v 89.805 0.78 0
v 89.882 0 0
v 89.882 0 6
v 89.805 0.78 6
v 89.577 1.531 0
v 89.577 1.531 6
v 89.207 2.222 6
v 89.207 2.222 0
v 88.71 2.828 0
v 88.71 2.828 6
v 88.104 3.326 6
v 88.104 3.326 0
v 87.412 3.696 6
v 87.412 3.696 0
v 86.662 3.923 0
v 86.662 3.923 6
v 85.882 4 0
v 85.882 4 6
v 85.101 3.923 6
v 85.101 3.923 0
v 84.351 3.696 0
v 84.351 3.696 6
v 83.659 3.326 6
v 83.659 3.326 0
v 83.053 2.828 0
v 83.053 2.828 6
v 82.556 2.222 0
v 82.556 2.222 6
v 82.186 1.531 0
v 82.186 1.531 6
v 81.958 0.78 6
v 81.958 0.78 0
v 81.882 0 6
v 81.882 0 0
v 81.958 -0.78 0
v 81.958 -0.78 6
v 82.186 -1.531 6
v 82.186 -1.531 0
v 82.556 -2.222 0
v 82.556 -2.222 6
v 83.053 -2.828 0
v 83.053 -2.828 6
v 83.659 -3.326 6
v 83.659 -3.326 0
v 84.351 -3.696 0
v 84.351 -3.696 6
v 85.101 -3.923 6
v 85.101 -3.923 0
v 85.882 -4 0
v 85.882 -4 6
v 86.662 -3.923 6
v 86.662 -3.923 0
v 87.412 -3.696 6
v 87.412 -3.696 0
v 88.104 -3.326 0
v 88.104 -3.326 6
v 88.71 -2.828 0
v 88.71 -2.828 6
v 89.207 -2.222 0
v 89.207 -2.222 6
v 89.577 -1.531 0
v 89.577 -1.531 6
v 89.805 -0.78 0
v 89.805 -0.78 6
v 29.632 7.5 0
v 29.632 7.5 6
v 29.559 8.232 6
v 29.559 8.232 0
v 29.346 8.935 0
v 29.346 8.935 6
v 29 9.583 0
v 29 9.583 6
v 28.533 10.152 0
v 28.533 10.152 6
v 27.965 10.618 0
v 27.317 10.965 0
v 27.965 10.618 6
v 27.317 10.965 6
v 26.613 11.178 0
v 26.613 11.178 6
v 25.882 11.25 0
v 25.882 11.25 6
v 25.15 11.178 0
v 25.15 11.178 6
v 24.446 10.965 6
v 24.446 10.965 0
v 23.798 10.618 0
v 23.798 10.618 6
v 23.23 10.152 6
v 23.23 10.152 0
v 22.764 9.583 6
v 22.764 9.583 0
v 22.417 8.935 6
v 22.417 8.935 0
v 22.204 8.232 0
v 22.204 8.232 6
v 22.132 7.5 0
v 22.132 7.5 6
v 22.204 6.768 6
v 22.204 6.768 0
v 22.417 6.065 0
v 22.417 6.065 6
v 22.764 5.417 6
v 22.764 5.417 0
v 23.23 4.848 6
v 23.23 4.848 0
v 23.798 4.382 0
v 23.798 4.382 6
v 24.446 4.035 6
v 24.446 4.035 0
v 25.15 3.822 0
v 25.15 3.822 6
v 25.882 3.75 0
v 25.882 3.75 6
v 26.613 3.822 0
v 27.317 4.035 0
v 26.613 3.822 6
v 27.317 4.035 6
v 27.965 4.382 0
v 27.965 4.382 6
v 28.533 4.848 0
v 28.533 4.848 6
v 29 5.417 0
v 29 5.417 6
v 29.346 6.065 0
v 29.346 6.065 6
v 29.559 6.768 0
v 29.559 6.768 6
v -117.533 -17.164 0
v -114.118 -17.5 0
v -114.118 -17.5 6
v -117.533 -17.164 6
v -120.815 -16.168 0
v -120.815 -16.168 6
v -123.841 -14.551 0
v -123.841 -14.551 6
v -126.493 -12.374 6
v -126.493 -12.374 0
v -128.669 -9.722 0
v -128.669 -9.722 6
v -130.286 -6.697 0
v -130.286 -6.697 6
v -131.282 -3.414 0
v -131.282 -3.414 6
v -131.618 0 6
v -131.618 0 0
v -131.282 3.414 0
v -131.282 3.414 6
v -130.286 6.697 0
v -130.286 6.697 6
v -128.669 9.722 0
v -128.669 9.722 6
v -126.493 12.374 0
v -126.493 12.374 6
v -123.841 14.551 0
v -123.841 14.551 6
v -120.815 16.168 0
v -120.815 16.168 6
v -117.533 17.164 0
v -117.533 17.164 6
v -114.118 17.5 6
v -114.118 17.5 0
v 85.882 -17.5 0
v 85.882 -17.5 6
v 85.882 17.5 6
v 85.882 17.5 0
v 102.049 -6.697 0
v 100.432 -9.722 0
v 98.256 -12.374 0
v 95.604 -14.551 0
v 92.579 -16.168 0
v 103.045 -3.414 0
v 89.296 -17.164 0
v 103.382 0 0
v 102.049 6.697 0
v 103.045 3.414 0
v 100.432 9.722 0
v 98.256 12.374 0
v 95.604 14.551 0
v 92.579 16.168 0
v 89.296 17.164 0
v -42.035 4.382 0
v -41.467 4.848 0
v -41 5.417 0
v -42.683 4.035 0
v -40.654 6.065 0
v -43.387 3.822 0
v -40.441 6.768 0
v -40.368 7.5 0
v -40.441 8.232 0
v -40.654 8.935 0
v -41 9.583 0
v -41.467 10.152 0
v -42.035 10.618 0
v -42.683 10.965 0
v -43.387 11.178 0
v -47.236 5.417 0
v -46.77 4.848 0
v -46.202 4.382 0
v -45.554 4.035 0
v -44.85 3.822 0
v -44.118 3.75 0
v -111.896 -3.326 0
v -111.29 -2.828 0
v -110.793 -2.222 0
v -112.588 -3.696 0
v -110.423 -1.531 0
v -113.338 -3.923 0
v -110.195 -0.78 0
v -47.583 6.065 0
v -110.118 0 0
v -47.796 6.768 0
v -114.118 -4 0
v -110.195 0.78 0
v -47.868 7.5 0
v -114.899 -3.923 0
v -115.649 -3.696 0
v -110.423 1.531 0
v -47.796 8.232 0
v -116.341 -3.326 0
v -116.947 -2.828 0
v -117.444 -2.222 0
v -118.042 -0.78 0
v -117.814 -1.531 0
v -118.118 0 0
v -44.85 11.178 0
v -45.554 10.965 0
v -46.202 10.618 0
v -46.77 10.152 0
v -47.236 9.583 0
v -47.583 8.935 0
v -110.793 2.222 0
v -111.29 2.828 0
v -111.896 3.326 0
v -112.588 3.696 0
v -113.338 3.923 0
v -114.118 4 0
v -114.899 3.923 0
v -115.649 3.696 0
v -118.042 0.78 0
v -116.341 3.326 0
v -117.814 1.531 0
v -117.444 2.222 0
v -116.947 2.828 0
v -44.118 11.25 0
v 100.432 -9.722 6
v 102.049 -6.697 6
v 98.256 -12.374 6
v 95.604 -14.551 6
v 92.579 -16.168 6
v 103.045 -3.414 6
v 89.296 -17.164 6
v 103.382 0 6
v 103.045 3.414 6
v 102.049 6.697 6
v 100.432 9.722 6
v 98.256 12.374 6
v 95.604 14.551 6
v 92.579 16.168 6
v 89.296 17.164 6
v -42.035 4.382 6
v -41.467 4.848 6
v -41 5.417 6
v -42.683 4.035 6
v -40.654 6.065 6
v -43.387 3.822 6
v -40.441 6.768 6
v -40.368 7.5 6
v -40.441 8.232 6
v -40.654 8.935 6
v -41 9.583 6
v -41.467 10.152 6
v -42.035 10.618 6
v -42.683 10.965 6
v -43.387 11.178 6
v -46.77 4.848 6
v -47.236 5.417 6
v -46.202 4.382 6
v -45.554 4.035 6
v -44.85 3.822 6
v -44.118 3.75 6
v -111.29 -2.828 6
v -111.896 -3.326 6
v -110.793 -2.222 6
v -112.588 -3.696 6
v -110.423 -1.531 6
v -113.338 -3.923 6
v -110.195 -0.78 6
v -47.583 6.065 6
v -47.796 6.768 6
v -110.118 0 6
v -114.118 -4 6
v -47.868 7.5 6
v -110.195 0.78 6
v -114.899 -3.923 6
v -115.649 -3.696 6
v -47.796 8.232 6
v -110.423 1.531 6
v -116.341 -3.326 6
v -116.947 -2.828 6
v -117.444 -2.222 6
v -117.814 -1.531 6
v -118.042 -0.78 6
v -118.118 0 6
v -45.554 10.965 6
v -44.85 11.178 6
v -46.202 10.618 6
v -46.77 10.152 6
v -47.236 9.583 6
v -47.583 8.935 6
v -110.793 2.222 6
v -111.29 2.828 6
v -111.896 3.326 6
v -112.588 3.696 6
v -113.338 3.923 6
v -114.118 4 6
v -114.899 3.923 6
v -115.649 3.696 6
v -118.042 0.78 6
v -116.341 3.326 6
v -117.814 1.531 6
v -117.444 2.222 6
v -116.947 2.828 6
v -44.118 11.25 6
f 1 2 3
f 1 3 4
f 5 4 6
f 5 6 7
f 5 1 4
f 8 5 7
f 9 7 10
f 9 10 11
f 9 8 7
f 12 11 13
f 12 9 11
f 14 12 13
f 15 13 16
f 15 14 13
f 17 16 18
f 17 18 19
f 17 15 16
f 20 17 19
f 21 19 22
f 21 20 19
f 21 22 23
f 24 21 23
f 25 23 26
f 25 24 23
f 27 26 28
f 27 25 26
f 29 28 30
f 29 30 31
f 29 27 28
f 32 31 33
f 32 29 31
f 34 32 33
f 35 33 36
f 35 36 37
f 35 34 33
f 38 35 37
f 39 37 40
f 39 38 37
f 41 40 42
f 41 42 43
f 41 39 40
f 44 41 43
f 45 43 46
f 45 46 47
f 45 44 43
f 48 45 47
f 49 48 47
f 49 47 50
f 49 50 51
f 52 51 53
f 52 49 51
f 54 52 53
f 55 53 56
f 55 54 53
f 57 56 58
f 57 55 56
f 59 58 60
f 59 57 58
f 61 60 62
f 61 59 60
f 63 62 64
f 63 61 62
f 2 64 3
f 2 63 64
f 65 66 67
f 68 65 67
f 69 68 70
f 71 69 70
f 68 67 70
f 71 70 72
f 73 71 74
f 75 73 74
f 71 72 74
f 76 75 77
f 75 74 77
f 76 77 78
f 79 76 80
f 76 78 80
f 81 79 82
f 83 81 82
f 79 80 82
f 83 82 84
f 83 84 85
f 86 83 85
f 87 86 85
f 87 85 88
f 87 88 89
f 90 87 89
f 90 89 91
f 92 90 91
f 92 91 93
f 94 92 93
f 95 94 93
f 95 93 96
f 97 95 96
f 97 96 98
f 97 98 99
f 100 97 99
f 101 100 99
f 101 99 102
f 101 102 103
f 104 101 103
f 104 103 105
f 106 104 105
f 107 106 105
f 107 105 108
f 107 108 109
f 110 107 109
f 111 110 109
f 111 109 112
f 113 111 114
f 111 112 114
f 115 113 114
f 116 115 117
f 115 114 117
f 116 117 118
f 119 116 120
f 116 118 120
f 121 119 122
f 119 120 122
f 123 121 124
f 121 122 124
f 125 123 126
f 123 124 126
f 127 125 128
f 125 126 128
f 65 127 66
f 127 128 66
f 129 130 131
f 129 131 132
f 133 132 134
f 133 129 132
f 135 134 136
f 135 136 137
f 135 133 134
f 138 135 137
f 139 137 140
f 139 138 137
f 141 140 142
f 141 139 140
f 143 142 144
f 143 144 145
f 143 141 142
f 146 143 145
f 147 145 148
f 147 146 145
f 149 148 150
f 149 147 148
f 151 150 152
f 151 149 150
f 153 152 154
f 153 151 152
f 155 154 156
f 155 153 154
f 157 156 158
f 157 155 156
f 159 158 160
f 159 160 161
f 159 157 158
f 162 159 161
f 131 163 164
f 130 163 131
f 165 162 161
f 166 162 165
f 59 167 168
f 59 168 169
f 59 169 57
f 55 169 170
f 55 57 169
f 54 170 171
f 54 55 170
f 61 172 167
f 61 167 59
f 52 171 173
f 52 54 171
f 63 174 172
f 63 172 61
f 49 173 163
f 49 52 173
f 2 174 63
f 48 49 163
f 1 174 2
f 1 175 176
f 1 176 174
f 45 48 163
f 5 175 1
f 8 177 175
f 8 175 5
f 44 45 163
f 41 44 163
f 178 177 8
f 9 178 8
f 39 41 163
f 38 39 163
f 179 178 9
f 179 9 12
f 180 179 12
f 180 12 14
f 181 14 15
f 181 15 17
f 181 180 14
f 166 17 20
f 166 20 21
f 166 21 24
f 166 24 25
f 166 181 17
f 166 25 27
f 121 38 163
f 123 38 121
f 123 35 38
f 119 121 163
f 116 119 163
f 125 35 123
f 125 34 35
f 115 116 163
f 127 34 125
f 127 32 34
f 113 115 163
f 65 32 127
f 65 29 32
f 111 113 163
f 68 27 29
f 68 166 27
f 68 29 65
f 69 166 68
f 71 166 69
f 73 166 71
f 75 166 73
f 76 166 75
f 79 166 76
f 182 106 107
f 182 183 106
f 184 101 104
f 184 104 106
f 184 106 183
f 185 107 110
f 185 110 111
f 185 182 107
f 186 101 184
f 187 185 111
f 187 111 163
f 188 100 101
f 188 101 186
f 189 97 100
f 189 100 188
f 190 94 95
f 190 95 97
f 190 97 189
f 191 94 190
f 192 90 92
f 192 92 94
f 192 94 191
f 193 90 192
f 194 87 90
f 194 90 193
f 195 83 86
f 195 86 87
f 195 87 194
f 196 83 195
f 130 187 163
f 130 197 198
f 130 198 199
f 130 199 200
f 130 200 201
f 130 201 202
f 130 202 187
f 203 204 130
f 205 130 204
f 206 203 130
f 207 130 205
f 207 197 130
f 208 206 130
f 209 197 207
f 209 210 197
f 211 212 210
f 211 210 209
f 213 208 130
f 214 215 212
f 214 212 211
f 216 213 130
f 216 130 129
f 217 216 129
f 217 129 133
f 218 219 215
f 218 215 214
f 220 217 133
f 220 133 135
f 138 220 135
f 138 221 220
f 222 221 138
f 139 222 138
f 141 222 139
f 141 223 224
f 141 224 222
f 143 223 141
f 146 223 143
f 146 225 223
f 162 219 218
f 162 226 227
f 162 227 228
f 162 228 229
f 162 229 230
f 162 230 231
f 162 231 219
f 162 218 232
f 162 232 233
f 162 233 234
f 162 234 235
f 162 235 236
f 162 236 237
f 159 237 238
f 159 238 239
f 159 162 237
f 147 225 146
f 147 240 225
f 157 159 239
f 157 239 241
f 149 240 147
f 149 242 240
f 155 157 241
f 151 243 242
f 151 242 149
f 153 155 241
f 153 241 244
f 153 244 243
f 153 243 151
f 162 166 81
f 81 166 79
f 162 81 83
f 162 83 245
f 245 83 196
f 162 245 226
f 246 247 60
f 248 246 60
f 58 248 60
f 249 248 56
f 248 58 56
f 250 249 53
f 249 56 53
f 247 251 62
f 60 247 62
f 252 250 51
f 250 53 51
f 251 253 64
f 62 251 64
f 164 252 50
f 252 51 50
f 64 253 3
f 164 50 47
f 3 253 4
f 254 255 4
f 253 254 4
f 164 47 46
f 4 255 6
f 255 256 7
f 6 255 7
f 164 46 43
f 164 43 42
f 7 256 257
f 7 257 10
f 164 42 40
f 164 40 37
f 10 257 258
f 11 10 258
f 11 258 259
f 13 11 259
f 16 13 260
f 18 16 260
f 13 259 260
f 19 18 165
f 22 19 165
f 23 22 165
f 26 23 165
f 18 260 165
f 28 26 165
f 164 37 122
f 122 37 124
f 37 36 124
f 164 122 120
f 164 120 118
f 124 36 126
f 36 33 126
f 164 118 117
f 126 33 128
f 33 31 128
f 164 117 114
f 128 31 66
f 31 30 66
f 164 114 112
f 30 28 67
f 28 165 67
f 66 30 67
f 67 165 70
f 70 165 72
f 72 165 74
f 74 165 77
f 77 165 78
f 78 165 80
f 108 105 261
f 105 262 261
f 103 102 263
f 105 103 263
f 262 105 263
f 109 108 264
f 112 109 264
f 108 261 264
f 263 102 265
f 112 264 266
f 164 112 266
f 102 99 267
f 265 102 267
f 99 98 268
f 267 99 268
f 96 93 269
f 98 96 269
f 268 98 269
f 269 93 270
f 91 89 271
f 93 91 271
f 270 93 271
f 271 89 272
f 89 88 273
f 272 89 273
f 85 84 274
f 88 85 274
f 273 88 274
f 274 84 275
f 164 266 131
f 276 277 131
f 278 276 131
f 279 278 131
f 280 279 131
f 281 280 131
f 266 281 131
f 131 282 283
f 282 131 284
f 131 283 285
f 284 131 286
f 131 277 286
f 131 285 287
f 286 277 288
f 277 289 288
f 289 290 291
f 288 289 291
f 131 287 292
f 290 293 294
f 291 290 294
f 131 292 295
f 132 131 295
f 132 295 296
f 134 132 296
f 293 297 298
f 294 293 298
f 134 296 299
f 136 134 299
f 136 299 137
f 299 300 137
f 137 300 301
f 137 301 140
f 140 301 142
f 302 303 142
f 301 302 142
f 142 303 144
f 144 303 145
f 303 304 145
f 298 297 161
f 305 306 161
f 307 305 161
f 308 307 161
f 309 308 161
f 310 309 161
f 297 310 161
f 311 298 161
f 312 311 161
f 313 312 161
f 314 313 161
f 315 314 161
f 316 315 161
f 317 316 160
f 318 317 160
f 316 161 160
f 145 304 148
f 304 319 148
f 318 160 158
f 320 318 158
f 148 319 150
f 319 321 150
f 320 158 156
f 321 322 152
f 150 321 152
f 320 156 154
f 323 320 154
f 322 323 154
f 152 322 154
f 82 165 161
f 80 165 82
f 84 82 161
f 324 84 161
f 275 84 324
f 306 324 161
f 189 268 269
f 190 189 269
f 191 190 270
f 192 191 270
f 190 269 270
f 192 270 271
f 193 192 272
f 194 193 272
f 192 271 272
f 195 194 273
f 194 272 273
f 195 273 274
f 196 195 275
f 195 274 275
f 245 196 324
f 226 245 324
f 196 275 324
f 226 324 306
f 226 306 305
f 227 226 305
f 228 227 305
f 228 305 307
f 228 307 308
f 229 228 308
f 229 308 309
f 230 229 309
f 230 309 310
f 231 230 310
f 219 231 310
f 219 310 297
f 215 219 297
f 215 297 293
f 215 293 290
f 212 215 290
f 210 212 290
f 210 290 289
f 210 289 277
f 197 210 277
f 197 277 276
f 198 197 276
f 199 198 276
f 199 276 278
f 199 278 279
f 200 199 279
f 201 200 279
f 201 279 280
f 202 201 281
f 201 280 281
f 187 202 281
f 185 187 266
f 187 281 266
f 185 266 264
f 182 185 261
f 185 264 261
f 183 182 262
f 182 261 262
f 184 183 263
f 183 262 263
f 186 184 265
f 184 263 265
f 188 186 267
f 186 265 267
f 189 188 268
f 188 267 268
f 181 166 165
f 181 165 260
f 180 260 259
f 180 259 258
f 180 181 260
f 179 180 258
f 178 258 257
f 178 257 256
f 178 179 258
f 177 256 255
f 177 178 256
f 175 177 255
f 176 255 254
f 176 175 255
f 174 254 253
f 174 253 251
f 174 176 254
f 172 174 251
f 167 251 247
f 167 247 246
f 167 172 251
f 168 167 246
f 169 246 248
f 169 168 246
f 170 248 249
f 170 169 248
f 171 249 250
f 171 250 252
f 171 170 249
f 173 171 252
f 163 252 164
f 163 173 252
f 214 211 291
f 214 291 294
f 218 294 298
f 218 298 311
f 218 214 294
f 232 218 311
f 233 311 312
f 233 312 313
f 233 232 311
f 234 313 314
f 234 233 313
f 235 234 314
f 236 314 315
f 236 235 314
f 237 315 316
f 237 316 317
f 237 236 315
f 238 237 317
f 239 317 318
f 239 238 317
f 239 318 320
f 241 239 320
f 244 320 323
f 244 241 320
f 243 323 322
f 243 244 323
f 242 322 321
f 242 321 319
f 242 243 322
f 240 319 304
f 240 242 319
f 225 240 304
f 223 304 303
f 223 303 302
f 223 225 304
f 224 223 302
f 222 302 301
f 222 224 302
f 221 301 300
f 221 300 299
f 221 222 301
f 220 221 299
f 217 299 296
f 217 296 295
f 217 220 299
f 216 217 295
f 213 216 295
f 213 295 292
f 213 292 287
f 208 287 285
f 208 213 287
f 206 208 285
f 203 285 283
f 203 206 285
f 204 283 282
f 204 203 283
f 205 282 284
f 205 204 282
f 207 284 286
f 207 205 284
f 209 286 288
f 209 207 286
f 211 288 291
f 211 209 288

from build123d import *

# Parameters (mm, degrees)
ESQUISSE1_R             = 4
BOSS_EXTRU_1_DEPTH      = 6
ENL_V_MAT_EXTRU_1_REACH = 134.912
ESQUISSE2_R             = 3.75


with BuildPart() as part:
    # Esquisse1 → Boss.-Extru.1 (new body)
    with BuildSketch(Plane.XY):
        with BuildLine():
            Line((-114.118449195, 17.5), (85.881550805, 17.5))
            ThreePointArc((85.881550805, 17.5), (103.381550805, 0), (85.881550805, -17.5))
            Line((85.881550805, -17.5), (-114.118449195, -17.5))
            ThreePointArc((-114.118449195, -17.5), (-131.618449195, 0), (-114.118449195, 17.5))
        make_face()
        with Locations((-114.118449195, 0)):
            Circle(ESQUISSE1_R, mode=Mode.SUBTRACT)
        with Locations((85.881550805, 0)):
            Circle(ESQUISSE1_R, mode=Mode.SUBTRACT)
    extrude(amount=BOSS_EXTRU_1_DEPTH)

    # Esquisse2 → Enlèv. mat.-Extru.1 (cut, up to next)
    with BuildSketch(Plane.XY.offset(6), mode=Mode.PRIVATE) as enl_v_mat_extru_1_sk1:
        with Locations((-44.118449195, 7.5)):
            Circle(ESQUISSE2_R)
    enl_v_mat_extru_1_tool1 = extrude(enl_v_mat_extru_1_sk1.sketch, amount=-ENL_V_MAT_EXTRU_1_REACH, mode=Mode.PRIVATE) & part.part
    # Esquisse2 → Enlèv. mat.-Extru.1 (cut, up to next)
    with BuildSketch(Plane.XY.offset(6), mode=Mode.PRIVATE) as enl_v_mat_extru_1_sk2:
        with Locations((25.881550805, 7.5)):
            Circle(ESQUISSE2_R)
    enl_v_mat_extru_1_tool2 = extrude(enl_v_mat_extru_1_sk2.sketch, amount=-ENL_V_MAT_EXTRU_1_REACH, mode=Mode.PRIVATE) & part.part
    add(enl_v_mat_extru_1_tool1.solids().sort_by_distance((-44.118449, 7.5, 6))[0], mode=Mode.SUBTRACT)
    add(enl_v_mat_extru_1_tool2.solids().sort_by_distance((25.881551, 7.5, 6))[0], mode=Mode.SUBTRACT)


solid = part.part
